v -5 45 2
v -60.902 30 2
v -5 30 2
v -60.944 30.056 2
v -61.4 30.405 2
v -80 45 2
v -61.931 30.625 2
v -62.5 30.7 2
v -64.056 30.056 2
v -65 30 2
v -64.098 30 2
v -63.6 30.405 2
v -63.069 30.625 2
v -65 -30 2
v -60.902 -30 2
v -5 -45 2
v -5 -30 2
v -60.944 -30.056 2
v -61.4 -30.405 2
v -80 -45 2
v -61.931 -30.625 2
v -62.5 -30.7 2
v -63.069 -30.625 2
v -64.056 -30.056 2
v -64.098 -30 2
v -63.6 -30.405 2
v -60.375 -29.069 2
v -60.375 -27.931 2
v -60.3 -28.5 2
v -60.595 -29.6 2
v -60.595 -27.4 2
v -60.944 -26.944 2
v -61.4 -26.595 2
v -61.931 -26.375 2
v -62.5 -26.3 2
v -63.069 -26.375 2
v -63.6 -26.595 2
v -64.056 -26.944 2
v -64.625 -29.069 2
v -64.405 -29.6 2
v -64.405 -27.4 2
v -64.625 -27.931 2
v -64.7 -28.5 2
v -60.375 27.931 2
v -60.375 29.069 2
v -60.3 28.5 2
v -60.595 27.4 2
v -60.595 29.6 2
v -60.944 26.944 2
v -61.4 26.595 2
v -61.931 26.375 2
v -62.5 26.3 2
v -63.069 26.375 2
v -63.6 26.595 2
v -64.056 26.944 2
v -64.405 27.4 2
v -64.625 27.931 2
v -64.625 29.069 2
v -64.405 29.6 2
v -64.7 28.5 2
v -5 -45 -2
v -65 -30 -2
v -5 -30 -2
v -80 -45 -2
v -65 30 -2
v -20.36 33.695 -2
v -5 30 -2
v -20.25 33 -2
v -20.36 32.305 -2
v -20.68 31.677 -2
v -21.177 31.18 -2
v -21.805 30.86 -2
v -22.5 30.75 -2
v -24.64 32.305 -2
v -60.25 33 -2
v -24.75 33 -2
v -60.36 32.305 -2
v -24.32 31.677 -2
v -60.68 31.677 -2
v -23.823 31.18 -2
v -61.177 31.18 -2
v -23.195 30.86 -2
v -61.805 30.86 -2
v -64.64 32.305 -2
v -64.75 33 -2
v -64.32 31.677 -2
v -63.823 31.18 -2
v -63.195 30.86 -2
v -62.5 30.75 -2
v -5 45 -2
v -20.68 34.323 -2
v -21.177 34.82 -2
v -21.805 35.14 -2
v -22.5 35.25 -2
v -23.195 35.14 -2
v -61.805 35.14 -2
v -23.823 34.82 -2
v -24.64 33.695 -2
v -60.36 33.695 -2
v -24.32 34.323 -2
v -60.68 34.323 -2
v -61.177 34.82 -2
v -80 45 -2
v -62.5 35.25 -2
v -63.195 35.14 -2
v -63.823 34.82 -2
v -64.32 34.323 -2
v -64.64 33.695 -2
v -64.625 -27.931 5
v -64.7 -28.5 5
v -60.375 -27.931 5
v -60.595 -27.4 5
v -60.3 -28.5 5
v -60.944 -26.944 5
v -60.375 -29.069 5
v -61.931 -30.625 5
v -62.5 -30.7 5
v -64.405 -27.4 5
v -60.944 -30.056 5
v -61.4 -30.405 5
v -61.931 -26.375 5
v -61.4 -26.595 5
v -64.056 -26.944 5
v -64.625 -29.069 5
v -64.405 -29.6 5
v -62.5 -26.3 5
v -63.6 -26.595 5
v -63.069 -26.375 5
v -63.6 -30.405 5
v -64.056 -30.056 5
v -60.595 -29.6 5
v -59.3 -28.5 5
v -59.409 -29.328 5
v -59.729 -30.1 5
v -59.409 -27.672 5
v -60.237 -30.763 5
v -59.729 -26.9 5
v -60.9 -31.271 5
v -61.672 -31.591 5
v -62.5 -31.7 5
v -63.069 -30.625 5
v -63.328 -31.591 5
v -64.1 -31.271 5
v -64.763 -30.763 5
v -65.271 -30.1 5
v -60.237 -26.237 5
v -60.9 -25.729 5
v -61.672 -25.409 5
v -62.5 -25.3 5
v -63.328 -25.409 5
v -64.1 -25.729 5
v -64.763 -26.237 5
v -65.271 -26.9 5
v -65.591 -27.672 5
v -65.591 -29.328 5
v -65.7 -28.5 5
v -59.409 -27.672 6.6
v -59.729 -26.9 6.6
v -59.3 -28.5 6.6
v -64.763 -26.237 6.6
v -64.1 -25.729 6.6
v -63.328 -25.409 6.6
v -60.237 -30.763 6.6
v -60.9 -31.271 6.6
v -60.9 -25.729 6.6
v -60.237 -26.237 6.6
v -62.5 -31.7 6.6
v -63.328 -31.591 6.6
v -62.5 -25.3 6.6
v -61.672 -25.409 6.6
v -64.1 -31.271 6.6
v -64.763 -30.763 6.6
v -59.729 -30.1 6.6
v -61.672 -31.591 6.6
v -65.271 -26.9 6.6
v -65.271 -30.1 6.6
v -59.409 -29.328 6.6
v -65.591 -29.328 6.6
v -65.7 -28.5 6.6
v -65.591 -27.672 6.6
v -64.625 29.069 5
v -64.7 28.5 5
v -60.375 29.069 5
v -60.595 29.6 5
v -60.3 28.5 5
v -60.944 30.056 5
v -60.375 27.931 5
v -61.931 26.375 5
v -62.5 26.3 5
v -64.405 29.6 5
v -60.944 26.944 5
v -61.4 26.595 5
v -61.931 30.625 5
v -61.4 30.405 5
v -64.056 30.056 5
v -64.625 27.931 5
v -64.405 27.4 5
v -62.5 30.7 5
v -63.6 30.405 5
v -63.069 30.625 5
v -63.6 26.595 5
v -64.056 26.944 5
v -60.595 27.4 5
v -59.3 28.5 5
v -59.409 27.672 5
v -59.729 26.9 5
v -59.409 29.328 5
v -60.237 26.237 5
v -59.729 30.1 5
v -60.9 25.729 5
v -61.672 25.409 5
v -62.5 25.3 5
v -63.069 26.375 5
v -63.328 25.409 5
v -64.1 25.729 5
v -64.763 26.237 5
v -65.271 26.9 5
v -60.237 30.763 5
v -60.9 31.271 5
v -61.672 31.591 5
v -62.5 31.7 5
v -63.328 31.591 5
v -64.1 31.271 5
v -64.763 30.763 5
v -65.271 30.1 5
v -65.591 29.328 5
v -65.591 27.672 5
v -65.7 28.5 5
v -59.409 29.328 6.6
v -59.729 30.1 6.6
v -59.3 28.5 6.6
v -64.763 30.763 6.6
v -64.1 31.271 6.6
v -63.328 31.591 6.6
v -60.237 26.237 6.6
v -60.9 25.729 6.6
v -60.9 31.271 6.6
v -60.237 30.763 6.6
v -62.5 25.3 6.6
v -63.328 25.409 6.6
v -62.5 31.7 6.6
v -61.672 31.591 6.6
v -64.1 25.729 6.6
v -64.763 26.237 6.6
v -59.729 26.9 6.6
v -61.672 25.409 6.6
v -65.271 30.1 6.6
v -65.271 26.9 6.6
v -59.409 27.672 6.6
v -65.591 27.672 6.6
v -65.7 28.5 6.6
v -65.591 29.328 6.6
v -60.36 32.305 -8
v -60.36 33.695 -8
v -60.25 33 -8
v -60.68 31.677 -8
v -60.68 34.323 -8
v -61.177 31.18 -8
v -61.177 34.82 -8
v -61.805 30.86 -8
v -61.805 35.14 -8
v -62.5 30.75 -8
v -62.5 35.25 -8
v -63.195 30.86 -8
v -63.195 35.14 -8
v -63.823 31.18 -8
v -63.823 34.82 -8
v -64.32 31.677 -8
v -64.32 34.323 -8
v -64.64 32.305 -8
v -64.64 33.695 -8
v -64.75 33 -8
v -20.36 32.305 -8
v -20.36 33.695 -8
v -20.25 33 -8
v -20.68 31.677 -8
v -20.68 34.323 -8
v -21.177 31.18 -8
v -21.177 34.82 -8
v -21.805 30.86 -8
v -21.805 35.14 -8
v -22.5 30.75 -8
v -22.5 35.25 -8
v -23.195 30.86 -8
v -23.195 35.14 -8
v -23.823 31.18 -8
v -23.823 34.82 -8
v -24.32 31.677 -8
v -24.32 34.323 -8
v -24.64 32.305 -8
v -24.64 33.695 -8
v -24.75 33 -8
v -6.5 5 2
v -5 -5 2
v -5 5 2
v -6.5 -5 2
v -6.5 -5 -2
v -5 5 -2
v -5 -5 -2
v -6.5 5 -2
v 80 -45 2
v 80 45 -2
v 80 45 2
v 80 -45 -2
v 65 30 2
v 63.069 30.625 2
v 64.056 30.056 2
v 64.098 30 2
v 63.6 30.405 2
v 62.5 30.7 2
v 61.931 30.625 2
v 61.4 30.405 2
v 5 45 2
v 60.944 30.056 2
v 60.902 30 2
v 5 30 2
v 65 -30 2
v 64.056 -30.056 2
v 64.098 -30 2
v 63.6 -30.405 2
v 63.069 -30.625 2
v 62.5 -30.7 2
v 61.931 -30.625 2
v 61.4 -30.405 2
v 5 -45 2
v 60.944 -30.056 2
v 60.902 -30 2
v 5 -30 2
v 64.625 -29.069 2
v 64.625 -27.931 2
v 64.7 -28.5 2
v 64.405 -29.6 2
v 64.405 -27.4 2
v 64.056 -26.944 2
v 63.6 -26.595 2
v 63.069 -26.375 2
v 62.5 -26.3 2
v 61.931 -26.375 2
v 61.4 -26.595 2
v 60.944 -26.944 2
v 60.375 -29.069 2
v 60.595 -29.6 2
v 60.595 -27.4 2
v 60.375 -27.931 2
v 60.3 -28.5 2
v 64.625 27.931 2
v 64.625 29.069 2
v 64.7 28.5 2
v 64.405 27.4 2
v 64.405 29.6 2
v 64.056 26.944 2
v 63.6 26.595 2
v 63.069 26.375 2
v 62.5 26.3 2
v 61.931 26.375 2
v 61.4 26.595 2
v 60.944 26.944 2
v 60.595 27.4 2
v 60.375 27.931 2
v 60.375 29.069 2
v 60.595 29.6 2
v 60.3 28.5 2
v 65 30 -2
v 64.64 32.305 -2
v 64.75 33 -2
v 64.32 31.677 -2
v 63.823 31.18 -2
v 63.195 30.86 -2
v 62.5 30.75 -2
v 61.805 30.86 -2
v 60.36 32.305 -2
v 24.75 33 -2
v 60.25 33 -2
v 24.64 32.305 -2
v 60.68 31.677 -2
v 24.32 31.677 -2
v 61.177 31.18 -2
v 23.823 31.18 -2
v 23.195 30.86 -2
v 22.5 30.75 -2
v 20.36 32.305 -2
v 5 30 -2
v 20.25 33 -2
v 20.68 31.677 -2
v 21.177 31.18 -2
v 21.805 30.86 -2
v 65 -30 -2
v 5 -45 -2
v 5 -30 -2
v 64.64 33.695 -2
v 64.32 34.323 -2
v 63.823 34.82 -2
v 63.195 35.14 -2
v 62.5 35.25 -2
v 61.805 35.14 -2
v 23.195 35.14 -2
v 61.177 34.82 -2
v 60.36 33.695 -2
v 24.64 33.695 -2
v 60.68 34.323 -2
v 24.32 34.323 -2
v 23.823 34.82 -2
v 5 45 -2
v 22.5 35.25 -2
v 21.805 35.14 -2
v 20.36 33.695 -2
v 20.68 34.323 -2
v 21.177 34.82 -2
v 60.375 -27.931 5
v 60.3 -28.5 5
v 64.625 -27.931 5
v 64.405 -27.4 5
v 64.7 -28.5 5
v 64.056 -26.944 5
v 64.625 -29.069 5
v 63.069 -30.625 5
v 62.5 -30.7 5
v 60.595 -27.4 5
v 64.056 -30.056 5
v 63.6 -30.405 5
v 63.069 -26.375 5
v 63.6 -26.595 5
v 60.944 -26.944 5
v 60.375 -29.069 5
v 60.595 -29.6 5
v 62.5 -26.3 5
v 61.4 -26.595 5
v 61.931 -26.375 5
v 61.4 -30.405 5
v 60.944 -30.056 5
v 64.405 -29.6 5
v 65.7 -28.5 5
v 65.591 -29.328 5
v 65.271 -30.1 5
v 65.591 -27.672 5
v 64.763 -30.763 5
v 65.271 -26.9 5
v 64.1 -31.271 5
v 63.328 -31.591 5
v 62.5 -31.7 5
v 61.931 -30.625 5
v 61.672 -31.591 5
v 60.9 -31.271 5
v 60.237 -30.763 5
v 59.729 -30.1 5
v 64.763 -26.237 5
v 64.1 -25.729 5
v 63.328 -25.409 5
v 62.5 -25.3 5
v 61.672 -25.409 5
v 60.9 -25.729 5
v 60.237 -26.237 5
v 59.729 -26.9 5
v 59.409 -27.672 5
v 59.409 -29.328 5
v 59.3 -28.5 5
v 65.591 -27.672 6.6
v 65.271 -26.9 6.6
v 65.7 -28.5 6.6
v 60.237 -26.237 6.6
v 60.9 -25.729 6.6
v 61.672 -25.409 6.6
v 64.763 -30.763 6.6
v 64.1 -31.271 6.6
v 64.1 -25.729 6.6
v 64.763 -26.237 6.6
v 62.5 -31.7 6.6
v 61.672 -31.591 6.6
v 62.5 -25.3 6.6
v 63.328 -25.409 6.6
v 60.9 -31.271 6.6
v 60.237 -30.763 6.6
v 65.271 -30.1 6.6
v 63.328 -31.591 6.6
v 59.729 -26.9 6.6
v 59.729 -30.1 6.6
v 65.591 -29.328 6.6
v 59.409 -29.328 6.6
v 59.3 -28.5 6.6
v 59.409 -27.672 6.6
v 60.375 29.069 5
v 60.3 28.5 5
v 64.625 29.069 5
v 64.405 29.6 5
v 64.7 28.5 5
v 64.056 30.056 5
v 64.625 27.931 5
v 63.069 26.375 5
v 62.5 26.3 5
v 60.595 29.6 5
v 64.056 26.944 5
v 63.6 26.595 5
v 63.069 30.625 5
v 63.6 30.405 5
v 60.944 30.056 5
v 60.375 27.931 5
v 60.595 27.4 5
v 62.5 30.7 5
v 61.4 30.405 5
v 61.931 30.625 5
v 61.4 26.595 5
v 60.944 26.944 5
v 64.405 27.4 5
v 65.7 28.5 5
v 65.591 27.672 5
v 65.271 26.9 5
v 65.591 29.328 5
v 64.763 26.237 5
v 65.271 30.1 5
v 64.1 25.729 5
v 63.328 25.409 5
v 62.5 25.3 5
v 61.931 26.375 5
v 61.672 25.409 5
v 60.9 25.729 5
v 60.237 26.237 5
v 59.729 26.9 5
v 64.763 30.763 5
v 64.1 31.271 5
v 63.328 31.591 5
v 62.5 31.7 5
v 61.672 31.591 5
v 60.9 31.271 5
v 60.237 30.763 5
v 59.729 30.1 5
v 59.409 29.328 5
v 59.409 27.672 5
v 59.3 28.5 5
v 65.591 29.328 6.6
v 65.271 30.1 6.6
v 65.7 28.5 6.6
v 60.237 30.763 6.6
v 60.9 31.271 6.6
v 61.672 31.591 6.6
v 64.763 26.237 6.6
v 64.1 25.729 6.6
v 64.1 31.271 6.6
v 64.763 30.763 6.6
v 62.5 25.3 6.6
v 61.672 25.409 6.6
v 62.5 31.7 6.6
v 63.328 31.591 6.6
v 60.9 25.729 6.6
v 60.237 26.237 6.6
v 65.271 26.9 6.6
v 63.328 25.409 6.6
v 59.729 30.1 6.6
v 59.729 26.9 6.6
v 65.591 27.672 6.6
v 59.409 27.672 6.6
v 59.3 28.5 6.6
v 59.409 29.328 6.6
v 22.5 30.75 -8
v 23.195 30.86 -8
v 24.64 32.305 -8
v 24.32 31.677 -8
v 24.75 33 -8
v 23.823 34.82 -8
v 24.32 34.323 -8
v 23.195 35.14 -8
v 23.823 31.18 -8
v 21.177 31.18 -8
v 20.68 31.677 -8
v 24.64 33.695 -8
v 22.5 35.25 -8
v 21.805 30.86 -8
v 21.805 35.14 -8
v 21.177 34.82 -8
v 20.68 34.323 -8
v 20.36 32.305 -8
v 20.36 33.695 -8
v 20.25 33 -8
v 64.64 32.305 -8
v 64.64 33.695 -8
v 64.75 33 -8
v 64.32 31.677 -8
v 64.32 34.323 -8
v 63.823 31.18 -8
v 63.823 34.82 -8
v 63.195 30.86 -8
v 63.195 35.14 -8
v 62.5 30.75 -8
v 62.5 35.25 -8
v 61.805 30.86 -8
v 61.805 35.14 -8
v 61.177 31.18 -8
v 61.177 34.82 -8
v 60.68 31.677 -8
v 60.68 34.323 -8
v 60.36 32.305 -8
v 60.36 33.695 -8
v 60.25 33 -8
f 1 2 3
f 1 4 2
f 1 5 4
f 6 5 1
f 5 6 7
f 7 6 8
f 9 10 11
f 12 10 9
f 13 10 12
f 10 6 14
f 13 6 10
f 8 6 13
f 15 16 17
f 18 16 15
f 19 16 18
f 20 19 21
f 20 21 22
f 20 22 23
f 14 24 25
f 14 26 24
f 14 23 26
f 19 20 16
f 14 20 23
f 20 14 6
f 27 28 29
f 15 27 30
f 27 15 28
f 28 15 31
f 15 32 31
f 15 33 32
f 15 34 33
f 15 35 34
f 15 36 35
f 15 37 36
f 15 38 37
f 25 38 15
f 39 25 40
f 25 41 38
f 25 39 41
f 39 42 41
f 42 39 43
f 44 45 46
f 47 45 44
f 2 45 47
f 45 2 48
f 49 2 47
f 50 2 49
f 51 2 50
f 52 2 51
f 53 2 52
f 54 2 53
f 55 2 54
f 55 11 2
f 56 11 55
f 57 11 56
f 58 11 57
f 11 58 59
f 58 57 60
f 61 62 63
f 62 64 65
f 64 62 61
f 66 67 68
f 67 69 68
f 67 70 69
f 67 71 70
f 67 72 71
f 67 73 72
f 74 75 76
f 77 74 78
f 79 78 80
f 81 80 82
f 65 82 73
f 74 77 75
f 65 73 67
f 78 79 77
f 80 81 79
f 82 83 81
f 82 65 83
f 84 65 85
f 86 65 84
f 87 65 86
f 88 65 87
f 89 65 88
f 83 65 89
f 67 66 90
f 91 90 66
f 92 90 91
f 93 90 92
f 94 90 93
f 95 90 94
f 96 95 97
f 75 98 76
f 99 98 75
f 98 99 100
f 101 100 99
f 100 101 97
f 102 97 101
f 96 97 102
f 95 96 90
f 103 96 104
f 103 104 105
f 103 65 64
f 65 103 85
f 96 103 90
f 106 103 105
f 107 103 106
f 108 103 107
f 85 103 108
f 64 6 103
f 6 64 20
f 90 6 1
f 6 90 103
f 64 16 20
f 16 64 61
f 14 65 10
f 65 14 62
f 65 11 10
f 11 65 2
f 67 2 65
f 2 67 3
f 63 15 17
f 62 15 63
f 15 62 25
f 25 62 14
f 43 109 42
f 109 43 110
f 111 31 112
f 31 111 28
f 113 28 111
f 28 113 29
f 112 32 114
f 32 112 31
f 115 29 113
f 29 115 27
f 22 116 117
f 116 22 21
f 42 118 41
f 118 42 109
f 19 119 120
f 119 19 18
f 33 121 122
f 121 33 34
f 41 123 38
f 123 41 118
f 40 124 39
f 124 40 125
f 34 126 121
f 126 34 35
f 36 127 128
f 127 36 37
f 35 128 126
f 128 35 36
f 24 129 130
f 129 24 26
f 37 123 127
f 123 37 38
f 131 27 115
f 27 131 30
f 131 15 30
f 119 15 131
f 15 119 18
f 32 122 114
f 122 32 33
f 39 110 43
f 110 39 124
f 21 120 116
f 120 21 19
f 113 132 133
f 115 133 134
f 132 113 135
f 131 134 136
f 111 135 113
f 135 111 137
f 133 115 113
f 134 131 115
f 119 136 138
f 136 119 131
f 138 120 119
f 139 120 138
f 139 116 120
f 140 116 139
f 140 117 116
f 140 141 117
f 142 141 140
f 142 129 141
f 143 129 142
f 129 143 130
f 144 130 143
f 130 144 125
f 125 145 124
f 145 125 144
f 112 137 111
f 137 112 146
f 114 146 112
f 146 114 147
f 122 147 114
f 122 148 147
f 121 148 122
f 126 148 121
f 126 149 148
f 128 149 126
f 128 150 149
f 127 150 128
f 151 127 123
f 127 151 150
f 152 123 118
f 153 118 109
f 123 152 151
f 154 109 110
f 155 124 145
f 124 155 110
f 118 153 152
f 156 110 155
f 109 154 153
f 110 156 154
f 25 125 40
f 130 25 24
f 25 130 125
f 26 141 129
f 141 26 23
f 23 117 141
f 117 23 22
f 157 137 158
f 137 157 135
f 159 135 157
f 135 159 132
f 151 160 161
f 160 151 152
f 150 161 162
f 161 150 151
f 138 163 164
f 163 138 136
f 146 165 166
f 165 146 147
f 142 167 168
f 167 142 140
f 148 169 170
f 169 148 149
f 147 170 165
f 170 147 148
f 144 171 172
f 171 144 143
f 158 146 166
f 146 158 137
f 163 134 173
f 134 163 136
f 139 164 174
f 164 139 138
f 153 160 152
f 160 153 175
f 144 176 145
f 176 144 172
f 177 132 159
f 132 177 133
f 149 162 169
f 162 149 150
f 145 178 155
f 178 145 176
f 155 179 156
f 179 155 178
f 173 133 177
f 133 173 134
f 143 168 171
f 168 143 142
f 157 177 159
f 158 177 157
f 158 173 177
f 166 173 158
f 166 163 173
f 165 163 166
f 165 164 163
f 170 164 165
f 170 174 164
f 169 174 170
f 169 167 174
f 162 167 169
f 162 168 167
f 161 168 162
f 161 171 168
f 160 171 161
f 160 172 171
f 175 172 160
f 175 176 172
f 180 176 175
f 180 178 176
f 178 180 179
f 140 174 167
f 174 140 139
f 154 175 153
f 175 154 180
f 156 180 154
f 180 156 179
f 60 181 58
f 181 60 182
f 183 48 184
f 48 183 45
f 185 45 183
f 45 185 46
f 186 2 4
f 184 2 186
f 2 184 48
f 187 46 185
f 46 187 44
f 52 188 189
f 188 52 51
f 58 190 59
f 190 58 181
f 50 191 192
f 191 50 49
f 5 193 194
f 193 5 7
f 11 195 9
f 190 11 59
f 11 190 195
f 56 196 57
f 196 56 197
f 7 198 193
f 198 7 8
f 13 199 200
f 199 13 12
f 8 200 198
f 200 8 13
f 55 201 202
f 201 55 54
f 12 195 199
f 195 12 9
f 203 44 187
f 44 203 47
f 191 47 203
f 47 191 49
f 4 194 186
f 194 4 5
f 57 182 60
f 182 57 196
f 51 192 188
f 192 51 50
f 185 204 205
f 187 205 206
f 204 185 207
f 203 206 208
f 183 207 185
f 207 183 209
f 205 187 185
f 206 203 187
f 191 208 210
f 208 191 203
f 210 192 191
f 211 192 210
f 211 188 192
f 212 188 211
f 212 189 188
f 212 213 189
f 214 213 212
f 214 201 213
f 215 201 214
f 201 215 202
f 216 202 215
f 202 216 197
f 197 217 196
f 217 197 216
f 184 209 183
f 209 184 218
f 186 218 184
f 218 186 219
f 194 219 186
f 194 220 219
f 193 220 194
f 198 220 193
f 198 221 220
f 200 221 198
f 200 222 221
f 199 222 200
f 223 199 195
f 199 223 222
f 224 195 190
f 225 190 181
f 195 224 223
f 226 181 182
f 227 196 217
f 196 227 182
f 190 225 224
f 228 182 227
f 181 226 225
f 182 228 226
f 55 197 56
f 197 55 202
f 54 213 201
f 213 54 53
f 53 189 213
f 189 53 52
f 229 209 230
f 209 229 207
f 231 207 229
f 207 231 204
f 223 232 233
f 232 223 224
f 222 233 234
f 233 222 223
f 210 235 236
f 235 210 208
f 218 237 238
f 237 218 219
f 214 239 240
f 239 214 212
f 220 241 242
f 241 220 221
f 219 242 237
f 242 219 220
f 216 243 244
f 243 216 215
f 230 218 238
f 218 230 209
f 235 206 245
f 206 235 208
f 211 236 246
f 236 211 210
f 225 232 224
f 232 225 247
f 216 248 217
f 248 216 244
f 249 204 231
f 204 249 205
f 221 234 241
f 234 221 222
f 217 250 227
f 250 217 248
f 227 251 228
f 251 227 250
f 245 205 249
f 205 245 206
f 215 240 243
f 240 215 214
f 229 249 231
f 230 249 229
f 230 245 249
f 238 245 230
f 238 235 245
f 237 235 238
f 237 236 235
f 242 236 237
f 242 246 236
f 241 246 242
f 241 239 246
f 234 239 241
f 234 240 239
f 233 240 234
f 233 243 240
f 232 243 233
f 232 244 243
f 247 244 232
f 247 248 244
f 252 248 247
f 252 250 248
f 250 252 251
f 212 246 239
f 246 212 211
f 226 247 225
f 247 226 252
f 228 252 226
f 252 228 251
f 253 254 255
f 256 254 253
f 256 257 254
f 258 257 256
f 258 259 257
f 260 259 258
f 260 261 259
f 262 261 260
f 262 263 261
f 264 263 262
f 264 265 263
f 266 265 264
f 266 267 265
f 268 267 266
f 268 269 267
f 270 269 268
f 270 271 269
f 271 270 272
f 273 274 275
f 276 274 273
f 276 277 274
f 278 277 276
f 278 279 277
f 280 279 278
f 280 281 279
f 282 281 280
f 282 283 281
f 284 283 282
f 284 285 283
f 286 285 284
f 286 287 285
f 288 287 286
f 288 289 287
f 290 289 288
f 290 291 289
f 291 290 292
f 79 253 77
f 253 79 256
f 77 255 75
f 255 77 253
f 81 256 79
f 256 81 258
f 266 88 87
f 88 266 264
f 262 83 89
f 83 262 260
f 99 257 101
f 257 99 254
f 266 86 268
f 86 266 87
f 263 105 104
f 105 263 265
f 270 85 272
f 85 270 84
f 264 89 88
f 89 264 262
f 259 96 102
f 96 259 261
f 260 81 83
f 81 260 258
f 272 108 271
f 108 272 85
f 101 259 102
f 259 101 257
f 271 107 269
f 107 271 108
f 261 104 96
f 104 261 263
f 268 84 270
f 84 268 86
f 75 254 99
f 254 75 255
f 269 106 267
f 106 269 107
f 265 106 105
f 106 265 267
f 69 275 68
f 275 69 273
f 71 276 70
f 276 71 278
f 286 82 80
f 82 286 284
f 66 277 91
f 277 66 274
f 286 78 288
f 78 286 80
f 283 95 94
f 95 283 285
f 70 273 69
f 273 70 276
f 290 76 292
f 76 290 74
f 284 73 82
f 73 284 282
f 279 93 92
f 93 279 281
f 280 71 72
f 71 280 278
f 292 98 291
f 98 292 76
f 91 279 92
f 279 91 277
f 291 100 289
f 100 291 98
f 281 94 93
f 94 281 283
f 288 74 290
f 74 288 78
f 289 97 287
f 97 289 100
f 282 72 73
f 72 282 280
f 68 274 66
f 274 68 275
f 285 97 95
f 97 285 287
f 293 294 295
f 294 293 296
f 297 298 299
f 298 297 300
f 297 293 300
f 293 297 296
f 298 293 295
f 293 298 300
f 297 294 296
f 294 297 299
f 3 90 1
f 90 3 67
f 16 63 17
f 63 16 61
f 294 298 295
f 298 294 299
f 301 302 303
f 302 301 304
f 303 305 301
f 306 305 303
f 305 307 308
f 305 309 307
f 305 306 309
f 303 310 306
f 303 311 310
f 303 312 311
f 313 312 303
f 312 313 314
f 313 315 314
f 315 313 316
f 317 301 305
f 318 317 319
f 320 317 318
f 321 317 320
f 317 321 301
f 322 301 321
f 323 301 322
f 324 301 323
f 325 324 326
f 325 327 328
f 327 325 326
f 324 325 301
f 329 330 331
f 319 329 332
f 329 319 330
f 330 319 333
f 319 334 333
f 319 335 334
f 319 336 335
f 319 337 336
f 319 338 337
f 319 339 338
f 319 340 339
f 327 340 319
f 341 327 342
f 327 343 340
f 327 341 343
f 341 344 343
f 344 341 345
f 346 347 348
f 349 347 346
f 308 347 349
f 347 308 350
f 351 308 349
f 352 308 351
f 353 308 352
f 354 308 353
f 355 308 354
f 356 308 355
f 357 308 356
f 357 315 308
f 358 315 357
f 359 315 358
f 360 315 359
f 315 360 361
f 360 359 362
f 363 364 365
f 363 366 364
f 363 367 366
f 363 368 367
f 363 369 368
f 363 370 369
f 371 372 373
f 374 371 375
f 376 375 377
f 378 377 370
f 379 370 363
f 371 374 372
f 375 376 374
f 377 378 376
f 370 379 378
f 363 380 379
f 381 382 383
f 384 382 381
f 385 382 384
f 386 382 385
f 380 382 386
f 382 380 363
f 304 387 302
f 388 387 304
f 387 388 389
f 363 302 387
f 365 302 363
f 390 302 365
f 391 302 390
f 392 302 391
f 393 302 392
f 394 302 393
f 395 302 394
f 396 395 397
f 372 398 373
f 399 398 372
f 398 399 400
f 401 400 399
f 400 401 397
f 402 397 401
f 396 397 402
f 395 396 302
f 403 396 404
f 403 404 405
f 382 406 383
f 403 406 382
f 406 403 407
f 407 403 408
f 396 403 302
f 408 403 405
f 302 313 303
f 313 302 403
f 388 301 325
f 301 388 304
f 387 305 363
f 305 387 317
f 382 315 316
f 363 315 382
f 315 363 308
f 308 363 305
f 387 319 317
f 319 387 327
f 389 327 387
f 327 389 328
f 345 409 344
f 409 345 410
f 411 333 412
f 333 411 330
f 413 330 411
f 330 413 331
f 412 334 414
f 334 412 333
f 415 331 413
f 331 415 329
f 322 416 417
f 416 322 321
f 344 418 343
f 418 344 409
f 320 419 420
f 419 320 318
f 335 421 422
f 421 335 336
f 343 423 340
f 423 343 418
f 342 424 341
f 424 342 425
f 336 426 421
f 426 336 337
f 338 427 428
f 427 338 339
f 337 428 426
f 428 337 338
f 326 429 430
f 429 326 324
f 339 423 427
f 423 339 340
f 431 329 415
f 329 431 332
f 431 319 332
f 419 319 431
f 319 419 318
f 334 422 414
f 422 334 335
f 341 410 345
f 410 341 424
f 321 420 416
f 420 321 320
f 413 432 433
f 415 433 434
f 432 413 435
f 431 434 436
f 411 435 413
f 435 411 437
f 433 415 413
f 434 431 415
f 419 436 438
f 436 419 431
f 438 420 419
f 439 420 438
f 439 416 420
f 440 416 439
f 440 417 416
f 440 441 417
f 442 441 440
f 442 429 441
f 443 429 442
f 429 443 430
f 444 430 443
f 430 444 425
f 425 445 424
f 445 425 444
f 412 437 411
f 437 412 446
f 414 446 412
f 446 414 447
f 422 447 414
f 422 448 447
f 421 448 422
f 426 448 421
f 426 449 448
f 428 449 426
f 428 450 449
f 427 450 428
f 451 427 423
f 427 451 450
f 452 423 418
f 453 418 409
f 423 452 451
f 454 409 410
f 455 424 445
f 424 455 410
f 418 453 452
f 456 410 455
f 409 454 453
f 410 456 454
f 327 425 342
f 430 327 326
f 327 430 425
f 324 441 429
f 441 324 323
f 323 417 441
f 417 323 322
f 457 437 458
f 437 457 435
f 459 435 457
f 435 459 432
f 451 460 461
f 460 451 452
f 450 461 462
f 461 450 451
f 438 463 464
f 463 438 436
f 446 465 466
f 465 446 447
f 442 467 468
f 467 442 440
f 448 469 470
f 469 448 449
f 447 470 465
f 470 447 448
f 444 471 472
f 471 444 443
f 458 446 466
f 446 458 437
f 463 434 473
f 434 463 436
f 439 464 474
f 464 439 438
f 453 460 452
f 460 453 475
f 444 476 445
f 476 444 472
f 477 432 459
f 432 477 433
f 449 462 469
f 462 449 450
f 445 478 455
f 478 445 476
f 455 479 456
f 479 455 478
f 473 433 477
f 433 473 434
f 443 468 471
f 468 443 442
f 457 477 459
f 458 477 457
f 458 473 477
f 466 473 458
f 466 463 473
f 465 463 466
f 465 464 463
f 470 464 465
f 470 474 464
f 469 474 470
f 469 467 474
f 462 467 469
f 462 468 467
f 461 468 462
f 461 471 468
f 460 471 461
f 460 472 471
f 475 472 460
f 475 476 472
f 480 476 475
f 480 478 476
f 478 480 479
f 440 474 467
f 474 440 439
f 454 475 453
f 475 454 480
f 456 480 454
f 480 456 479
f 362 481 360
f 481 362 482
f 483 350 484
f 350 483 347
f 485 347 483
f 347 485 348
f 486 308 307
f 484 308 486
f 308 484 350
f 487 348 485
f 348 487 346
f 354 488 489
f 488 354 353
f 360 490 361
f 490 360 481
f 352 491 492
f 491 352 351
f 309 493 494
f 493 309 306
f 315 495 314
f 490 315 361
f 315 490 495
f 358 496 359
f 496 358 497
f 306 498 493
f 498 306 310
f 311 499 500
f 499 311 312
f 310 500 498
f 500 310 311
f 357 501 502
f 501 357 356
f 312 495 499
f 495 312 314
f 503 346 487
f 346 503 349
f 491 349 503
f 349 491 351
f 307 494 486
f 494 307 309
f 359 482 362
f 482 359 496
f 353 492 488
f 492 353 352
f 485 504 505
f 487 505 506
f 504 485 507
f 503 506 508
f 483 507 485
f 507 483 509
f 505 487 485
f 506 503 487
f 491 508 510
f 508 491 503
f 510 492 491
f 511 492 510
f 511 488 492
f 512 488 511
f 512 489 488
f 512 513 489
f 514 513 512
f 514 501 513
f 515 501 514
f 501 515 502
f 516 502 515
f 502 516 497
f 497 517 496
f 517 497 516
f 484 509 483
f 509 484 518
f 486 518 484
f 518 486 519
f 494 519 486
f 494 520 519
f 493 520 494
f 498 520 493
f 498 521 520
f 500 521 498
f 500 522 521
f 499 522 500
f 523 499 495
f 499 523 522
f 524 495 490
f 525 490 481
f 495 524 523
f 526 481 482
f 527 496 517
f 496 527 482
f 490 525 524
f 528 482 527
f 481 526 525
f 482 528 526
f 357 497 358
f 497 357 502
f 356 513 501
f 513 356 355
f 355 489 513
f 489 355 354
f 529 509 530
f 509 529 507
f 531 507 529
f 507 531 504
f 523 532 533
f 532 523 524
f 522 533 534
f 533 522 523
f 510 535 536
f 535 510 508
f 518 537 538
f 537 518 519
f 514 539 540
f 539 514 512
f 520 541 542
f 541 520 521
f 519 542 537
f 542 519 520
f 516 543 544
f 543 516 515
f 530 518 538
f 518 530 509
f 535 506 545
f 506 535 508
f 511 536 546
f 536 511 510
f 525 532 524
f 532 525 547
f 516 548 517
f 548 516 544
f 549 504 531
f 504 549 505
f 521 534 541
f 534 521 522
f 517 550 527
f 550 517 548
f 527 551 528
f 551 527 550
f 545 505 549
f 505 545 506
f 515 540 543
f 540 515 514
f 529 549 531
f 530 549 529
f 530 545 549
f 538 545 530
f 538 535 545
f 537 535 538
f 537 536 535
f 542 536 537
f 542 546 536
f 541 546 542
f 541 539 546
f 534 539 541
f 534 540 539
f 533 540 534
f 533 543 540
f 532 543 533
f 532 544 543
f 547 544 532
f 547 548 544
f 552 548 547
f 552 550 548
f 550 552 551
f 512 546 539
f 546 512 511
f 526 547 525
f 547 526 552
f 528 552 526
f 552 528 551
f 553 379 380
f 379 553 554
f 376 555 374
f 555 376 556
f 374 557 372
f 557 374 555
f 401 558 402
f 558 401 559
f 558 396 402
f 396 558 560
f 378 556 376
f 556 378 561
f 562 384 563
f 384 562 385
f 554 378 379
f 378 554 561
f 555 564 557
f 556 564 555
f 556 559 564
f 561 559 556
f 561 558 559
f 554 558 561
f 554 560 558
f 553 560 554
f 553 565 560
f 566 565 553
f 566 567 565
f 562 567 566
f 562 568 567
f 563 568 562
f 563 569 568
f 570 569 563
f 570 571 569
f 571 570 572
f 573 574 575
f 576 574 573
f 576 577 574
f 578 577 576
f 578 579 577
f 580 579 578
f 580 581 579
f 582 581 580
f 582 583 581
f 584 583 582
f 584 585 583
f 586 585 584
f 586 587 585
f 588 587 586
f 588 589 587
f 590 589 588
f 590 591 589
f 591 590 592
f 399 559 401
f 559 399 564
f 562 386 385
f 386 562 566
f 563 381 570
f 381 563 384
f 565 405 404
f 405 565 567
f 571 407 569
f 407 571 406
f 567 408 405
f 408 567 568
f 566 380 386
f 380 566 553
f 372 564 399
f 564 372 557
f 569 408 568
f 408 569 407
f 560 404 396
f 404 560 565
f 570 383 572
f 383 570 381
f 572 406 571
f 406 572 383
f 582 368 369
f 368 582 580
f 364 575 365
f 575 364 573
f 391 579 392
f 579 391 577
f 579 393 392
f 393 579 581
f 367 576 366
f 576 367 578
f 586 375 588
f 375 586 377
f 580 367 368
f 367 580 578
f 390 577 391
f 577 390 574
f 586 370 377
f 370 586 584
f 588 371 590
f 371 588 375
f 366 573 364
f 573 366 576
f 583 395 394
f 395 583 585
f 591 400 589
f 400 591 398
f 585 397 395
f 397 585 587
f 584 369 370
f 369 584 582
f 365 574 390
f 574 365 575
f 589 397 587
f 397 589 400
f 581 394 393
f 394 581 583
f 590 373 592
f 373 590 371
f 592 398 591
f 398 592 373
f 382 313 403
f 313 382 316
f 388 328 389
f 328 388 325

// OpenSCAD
// Raspberry Pi Touch Display 1 (7", DSI) - IKEA SKADIS mount
// Adapted from printables.com/model/1396822 (Touch Display 2 version).
// Same overall structure as the original: two interlocking halves,
// open frame ring, SKADIS pegs on the back. Original's inner edge has
// clip teeth that grip Display 2's case channel directly -- Display 1
// has no such channel, only 4 keyhole slots on the PCB back, so the
// clip teeth are replaced with molded keyhole legs (you slide the leg
// into the slot, that's the whole attachment -- no hardware).
// SKADIS pegs use a standard drop-lock nub (round peg, slides down
// into the slot's narrow channel) at the 40mm pitch measured from the
// original model -- that pitch has to match the pegboard grid exactly.

// ---- Display 1 mounting spec (user-measured / user-confirmed) ----
hole_spacing_x = 115;  // mm, horizontal spacing between keyhole legs
hole_spacing_y = 57;   // mm, vertical spacing between keyhole legs
slot_narrow_w  = 5;    // mm, narrow (locked) part of keyhole slot
slot_wide_h    = 7;    // mm, wide (entry) part of keyhole slot
slot_depth     = 3;    // mm, gap between frame and leg head (board thickness clearance)

// ---- Frame (open ring, like the original) ----
frame_w  = hole_spacing_x + 35;  // 150mm
frame_h  = hole_spacing_y + 33;  // 90mm
frame_t  = 4;                    // frame thickness
border   = 15;                   // ring wall width

// ---- Molded keyhole leg (mushroom standoff) ----
leg_neck_d = slot_narrow_w - 0.6;  // clearance to slide in narrow slot
leg_head_d = slot_wide_h - 0.6;    // must pass wide entry, catch on narrow slot
leg_head_h = 1.6;
leg_neck_h = slot_depth;

// ---- SKADIS peg (back face) ----
skadis_pitch = 40;   // measured from original model -- must match pegboard grid
skadis_peg_d = 4.5;  // mm, drop-lock nub diameter
skadis_peg_h = 6;    // mm, length poking through the pegboard

// ---- Half-interlock tab ----
tab_w = 3; tab_h = 10; tab_t = frame_t;

module keyhole_leg() {
    translate([0, 0, frame_t])
        cylinder(d = leg_neck_d, h = leg_neck_h, $fn = 24);
    translate([0, 0, frame_t + leg_neck_h])
        cylinder(d = leg_head_d, h = leg_head_h, $fn = 24);
}

module skadis_drop_peg() {
    rotate([180, 0, 0])
        cylinder(d = skadis_peg_d, h = skadis_peg_h, $fn = 20);
}

module frame_ring() {
    difference() {
        cube([frame_w, frame_h, frame_t], center = true);
        cube([frame_w - 2*border, frame_h - 2*border, frame_t + 1], center = true);
    }
}

module full_assembly() {
    union() {
        frame_ring();

        for (x = [-hole_spacing_x/2, hole_spacing_x/2])
            for (y = [-hole_spacing_y/2, hole_spacing_y/2])
                translate([x, y, -frame_t/2])
                    keyhole_leg();

        for (hx = [-frame_w/4, frame_w/4])
            for (x = [-skadis_pitch/2, skadis_pitch/2])
                translate([hx + x, frame_h/2 - 12, -frame_t/2])
                    skadis_drop_peg();

        // interlock tab (left half) / slot is cut from right half below
        translate([-tab_w/2, -tab_h/2, -tab_t/2])
            cube([tab_w, tab_h, tab_t]);
    }
}

module left_half() {
    intersection() {
        full_assembly();
        translate([-frame_w, -frame_h, -frame_t*2])
            cube([frame_w, frame_h*2, frame_t*4]);
    }
}

module right_half() {
    difference() {
        intersection() {
            full_assembly();
            translate([0, -frame_h, -frame_t*2])
                cube([frame_w, frame_h*2, frame_t*4]);
        }
        // slot for left half's interlock tab
        translate([-tab_w/2 - 0.2, -tab_h/2 - 0.2, -tab_t/2 - 0.2])
            cube([tab_w + 0.4, tab_h + 0.4, tab_t + 0.4]);
    }
}

// preview: both halves laid out side by side with a gap
translate([-5, 0, 0]) left_half();
translate([5, 0, 0]) right_half();
